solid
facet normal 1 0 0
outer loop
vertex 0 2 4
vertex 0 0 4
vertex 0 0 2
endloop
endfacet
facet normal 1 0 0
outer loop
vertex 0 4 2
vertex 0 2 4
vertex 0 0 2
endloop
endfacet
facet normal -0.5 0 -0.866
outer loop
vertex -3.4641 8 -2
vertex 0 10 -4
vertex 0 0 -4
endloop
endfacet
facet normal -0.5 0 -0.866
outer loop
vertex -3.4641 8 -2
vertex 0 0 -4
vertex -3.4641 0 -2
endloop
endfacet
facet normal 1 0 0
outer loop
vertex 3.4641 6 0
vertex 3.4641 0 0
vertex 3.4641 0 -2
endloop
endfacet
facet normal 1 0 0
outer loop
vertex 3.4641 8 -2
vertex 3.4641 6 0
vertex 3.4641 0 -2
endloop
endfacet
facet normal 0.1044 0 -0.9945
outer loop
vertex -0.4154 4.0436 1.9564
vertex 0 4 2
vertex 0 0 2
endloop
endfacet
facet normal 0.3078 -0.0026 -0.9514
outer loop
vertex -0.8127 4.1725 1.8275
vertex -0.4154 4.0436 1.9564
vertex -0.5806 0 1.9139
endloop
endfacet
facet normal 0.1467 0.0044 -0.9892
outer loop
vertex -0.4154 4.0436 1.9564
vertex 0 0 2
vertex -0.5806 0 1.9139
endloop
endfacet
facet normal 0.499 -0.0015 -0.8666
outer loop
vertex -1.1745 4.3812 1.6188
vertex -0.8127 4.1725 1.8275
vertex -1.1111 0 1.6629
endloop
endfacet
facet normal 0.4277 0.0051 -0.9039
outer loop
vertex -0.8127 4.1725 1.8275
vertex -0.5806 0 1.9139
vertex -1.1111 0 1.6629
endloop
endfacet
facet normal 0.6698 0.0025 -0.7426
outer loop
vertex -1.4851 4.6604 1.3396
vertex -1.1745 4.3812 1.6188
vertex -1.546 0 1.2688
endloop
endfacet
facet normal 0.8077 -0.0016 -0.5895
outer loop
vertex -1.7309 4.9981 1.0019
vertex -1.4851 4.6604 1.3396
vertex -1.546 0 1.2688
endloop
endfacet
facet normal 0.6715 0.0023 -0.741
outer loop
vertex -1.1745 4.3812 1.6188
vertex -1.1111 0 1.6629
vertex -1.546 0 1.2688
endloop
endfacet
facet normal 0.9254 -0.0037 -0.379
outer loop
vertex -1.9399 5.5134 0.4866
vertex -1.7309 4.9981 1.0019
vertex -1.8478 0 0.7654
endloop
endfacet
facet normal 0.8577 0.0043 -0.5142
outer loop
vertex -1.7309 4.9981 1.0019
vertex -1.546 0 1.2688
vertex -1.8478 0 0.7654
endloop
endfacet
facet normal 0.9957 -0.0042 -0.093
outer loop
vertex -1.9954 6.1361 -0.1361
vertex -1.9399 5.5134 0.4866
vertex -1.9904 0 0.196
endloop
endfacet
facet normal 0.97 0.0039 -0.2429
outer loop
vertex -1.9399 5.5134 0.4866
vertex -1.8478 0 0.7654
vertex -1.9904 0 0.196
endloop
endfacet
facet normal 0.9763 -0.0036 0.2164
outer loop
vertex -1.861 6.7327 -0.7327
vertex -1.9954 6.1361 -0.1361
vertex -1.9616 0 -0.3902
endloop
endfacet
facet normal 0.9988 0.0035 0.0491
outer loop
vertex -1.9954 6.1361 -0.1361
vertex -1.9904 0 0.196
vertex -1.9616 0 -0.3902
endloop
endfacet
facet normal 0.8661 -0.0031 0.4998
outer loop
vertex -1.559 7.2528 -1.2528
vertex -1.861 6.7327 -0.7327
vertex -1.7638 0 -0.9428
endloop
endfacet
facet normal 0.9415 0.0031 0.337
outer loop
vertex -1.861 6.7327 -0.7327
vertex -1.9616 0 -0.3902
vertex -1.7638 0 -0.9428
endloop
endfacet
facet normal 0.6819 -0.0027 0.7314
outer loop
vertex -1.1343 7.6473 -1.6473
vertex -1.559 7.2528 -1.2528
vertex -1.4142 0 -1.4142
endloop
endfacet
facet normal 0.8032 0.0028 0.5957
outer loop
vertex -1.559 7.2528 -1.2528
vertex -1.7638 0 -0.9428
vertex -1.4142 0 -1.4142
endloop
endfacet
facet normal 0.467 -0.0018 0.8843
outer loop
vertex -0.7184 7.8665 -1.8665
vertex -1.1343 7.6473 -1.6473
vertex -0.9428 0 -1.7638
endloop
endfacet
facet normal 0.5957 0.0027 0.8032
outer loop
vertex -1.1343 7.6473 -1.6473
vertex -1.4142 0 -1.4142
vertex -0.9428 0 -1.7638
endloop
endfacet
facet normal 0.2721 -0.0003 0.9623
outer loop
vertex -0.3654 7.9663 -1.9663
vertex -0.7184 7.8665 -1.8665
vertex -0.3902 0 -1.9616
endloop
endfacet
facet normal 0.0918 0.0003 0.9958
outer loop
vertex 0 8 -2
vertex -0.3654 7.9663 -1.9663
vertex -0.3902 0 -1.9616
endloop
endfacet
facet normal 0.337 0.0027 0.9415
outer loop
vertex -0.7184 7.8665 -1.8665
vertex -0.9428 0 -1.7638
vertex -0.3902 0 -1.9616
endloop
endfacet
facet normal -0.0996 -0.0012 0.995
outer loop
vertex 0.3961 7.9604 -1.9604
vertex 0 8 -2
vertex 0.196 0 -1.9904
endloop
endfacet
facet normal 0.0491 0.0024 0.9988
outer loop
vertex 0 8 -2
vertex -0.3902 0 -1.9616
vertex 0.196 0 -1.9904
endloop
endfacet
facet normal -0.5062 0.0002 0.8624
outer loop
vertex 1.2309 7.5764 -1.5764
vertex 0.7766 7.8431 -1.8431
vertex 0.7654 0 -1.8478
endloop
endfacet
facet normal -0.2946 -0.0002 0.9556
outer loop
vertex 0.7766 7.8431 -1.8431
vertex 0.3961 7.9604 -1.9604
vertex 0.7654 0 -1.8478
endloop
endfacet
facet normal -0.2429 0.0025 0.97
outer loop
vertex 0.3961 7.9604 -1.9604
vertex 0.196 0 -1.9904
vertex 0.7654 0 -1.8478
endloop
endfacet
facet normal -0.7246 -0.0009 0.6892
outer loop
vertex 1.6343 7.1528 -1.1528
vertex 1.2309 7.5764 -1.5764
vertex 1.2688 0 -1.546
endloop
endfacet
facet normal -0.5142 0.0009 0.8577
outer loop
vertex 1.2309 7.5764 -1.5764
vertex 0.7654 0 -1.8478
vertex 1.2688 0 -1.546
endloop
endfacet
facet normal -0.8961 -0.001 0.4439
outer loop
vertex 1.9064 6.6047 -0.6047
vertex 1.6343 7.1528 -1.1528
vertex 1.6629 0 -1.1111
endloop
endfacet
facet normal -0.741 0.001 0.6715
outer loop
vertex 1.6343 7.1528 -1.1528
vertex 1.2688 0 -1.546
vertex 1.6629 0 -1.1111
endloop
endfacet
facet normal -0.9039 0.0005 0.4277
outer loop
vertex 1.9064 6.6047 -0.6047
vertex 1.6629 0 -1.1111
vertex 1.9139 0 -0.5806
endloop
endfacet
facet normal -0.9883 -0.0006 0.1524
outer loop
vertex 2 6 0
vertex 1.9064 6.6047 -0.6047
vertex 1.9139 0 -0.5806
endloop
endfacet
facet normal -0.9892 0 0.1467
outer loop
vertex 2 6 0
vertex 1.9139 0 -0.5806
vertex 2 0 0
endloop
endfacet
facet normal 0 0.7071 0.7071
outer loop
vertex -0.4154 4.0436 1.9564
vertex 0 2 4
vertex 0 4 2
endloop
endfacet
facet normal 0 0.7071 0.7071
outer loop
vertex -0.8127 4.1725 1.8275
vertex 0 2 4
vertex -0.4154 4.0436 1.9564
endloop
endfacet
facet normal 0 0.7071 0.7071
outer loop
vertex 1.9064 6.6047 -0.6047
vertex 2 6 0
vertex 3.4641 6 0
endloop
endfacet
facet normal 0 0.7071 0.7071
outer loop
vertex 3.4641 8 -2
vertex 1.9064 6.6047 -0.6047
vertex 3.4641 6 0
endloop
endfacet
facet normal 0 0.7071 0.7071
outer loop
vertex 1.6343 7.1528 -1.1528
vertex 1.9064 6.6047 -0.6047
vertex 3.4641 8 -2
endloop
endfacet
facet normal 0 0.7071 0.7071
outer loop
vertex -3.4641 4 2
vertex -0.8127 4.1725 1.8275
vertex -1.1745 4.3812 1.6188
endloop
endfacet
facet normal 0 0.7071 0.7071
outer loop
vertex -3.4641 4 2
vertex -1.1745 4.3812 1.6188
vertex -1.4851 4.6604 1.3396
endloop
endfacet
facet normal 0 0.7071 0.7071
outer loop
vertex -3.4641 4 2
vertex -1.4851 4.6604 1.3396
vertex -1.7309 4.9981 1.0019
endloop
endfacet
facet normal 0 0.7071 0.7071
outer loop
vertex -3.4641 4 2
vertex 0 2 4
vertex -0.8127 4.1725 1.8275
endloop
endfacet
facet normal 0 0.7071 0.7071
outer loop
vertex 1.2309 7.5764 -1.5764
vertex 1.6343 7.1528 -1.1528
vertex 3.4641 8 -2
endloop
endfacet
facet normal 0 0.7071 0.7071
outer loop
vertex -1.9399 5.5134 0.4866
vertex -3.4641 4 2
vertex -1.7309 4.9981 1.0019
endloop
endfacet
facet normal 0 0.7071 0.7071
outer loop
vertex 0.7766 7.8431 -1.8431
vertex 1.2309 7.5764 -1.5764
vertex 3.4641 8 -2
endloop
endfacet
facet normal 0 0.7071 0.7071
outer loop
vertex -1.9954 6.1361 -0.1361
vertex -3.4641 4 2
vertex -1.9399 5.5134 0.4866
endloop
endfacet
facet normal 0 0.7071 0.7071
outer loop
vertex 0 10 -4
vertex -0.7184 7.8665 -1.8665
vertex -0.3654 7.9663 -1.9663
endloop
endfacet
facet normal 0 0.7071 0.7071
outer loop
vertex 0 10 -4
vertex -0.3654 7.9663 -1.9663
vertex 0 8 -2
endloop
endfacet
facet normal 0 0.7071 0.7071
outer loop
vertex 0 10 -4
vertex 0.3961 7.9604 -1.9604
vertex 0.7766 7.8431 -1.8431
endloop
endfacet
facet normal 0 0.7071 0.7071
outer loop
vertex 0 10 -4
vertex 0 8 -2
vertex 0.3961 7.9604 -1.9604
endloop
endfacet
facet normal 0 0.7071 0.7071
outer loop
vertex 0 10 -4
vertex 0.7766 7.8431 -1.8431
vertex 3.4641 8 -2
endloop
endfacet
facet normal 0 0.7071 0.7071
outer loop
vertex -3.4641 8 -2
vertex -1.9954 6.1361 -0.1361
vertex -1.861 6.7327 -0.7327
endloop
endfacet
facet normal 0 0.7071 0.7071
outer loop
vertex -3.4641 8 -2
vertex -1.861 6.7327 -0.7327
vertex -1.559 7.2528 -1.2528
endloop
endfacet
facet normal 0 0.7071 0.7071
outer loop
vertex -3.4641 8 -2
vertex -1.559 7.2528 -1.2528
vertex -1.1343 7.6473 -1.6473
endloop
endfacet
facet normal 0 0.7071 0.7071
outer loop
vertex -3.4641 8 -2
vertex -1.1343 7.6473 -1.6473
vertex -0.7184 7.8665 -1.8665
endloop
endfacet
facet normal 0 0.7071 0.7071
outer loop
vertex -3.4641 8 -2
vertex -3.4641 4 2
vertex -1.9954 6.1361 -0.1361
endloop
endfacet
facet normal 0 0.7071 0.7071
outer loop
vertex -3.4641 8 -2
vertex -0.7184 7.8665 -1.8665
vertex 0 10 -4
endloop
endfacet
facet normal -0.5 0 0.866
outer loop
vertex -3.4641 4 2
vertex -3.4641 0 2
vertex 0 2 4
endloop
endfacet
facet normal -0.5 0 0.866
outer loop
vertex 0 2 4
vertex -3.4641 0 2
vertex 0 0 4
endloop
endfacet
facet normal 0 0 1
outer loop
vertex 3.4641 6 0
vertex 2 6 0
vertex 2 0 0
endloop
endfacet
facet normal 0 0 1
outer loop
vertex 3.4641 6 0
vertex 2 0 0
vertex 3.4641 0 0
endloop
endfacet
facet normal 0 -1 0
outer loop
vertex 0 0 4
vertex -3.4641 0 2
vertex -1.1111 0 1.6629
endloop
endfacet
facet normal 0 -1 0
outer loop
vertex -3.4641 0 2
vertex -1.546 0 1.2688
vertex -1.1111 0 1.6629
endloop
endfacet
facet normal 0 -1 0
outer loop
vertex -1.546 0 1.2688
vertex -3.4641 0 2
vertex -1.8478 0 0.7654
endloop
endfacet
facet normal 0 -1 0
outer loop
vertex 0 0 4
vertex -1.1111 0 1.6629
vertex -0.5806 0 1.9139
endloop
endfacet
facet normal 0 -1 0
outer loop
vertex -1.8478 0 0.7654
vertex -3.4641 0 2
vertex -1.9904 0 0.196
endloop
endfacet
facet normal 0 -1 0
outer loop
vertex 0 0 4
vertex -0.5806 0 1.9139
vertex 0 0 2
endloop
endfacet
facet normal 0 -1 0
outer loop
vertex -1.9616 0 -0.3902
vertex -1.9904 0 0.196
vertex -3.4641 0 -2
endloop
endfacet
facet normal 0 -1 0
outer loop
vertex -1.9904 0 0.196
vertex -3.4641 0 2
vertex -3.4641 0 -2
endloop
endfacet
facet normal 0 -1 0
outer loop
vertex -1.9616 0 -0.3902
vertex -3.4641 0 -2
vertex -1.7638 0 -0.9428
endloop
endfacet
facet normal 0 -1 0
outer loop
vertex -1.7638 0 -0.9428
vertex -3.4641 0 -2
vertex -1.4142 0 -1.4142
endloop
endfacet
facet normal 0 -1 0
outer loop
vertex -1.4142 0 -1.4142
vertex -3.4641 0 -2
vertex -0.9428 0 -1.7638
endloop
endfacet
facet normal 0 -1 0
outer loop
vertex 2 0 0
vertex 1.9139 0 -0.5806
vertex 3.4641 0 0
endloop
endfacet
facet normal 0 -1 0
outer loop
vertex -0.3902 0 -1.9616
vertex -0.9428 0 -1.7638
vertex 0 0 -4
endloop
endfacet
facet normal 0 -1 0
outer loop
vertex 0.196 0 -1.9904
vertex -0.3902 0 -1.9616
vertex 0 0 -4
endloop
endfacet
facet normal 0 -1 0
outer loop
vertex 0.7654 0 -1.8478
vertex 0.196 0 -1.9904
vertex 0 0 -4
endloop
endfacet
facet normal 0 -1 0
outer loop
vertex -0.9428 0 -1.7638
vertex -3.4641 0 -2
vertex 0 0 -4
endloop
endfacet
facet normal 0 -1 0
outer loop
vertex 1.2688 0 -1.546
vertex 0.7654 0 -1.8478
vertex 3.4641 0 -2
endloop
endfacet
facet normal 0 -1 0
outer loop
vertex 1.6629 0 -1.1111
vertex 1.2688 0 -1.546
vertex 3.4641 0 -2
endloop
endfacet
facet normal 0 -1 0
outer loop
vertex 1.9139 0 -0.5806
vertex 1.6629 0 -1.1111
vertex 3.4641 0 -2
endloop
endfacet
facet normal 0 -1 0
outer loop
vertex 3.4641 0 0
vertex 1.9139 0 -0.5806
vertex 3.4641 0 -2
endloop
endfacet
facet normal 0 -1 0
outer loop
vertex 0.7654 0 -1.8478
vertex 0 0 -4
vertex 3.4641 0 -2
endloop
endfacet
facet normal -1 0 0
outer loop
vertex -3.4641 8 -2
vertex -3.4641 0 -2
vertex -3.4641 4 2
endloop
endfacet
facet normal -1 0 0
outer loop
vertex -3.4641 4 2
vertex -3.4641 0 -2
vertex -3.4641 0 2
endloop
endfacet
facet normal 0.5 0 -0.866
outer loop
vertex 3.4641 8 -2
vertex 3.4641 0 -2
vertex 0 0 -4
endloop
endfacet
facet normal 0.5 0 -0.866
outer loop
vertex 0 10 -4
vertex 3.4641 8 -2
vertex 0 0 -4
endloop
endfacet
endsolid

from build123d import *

# Parameters (mm, degrees)
BOSS_EXTRUDE1_DEPTH     = 10
CUT_EXTRUDE2_DEPTH      = 10
CUT_EXTRUDE2_DEPTH_BACK = 10


with BuildPart() as part:
    # Sketch1 → Boss-Extrude1 (new body)
    with BuildSketch(Plane(origin=(0, 0, 0), x_dir=(1, 0, 0), z_dir=(0, 1, 0))):
        with BuildLine():
            Line((2, 0), (3.464101615, 0))
            Line((3.464101615, 0), (3.464101615, 2))
            Line((3.464101615, 2), (0, 4))
            Line((0, 4), (-3.464101615, 2))
            Line((-3.464101615, 2), (-3.464101615, -2))
            Line((-3.464101615, -2), (0, -4))
            Line((0, -4), (0, -2))
            ThreePointArc((0, -2), (-1.414213562, 1.414213562), (2, 0))
        make_face()
    extrude(amount=BOSS_EXTRUDE1_DEPTH)

    # Sketch3 → Cut-Extrude2 (cut, two sides)
    with BuildSketch(Plane(origin=(0, 0, 0), x_dir=(0, 0, -1), z_dir=(1, 0, 0))) as cut_extrude2_sk:
        Polygon((-4, 2), (4, 10), (-4, 10), align=None)
    extrude(amount=CUT_EXTRUDE2_DEPTH, mode=Mode.SUBTRACT)
    extrude(cut_extrude2_sk.sketch, amount=-CUT_EXTRUDE2_DEPTH_BACK, mode=Mode.SUBTRACT)


solid = part.part
